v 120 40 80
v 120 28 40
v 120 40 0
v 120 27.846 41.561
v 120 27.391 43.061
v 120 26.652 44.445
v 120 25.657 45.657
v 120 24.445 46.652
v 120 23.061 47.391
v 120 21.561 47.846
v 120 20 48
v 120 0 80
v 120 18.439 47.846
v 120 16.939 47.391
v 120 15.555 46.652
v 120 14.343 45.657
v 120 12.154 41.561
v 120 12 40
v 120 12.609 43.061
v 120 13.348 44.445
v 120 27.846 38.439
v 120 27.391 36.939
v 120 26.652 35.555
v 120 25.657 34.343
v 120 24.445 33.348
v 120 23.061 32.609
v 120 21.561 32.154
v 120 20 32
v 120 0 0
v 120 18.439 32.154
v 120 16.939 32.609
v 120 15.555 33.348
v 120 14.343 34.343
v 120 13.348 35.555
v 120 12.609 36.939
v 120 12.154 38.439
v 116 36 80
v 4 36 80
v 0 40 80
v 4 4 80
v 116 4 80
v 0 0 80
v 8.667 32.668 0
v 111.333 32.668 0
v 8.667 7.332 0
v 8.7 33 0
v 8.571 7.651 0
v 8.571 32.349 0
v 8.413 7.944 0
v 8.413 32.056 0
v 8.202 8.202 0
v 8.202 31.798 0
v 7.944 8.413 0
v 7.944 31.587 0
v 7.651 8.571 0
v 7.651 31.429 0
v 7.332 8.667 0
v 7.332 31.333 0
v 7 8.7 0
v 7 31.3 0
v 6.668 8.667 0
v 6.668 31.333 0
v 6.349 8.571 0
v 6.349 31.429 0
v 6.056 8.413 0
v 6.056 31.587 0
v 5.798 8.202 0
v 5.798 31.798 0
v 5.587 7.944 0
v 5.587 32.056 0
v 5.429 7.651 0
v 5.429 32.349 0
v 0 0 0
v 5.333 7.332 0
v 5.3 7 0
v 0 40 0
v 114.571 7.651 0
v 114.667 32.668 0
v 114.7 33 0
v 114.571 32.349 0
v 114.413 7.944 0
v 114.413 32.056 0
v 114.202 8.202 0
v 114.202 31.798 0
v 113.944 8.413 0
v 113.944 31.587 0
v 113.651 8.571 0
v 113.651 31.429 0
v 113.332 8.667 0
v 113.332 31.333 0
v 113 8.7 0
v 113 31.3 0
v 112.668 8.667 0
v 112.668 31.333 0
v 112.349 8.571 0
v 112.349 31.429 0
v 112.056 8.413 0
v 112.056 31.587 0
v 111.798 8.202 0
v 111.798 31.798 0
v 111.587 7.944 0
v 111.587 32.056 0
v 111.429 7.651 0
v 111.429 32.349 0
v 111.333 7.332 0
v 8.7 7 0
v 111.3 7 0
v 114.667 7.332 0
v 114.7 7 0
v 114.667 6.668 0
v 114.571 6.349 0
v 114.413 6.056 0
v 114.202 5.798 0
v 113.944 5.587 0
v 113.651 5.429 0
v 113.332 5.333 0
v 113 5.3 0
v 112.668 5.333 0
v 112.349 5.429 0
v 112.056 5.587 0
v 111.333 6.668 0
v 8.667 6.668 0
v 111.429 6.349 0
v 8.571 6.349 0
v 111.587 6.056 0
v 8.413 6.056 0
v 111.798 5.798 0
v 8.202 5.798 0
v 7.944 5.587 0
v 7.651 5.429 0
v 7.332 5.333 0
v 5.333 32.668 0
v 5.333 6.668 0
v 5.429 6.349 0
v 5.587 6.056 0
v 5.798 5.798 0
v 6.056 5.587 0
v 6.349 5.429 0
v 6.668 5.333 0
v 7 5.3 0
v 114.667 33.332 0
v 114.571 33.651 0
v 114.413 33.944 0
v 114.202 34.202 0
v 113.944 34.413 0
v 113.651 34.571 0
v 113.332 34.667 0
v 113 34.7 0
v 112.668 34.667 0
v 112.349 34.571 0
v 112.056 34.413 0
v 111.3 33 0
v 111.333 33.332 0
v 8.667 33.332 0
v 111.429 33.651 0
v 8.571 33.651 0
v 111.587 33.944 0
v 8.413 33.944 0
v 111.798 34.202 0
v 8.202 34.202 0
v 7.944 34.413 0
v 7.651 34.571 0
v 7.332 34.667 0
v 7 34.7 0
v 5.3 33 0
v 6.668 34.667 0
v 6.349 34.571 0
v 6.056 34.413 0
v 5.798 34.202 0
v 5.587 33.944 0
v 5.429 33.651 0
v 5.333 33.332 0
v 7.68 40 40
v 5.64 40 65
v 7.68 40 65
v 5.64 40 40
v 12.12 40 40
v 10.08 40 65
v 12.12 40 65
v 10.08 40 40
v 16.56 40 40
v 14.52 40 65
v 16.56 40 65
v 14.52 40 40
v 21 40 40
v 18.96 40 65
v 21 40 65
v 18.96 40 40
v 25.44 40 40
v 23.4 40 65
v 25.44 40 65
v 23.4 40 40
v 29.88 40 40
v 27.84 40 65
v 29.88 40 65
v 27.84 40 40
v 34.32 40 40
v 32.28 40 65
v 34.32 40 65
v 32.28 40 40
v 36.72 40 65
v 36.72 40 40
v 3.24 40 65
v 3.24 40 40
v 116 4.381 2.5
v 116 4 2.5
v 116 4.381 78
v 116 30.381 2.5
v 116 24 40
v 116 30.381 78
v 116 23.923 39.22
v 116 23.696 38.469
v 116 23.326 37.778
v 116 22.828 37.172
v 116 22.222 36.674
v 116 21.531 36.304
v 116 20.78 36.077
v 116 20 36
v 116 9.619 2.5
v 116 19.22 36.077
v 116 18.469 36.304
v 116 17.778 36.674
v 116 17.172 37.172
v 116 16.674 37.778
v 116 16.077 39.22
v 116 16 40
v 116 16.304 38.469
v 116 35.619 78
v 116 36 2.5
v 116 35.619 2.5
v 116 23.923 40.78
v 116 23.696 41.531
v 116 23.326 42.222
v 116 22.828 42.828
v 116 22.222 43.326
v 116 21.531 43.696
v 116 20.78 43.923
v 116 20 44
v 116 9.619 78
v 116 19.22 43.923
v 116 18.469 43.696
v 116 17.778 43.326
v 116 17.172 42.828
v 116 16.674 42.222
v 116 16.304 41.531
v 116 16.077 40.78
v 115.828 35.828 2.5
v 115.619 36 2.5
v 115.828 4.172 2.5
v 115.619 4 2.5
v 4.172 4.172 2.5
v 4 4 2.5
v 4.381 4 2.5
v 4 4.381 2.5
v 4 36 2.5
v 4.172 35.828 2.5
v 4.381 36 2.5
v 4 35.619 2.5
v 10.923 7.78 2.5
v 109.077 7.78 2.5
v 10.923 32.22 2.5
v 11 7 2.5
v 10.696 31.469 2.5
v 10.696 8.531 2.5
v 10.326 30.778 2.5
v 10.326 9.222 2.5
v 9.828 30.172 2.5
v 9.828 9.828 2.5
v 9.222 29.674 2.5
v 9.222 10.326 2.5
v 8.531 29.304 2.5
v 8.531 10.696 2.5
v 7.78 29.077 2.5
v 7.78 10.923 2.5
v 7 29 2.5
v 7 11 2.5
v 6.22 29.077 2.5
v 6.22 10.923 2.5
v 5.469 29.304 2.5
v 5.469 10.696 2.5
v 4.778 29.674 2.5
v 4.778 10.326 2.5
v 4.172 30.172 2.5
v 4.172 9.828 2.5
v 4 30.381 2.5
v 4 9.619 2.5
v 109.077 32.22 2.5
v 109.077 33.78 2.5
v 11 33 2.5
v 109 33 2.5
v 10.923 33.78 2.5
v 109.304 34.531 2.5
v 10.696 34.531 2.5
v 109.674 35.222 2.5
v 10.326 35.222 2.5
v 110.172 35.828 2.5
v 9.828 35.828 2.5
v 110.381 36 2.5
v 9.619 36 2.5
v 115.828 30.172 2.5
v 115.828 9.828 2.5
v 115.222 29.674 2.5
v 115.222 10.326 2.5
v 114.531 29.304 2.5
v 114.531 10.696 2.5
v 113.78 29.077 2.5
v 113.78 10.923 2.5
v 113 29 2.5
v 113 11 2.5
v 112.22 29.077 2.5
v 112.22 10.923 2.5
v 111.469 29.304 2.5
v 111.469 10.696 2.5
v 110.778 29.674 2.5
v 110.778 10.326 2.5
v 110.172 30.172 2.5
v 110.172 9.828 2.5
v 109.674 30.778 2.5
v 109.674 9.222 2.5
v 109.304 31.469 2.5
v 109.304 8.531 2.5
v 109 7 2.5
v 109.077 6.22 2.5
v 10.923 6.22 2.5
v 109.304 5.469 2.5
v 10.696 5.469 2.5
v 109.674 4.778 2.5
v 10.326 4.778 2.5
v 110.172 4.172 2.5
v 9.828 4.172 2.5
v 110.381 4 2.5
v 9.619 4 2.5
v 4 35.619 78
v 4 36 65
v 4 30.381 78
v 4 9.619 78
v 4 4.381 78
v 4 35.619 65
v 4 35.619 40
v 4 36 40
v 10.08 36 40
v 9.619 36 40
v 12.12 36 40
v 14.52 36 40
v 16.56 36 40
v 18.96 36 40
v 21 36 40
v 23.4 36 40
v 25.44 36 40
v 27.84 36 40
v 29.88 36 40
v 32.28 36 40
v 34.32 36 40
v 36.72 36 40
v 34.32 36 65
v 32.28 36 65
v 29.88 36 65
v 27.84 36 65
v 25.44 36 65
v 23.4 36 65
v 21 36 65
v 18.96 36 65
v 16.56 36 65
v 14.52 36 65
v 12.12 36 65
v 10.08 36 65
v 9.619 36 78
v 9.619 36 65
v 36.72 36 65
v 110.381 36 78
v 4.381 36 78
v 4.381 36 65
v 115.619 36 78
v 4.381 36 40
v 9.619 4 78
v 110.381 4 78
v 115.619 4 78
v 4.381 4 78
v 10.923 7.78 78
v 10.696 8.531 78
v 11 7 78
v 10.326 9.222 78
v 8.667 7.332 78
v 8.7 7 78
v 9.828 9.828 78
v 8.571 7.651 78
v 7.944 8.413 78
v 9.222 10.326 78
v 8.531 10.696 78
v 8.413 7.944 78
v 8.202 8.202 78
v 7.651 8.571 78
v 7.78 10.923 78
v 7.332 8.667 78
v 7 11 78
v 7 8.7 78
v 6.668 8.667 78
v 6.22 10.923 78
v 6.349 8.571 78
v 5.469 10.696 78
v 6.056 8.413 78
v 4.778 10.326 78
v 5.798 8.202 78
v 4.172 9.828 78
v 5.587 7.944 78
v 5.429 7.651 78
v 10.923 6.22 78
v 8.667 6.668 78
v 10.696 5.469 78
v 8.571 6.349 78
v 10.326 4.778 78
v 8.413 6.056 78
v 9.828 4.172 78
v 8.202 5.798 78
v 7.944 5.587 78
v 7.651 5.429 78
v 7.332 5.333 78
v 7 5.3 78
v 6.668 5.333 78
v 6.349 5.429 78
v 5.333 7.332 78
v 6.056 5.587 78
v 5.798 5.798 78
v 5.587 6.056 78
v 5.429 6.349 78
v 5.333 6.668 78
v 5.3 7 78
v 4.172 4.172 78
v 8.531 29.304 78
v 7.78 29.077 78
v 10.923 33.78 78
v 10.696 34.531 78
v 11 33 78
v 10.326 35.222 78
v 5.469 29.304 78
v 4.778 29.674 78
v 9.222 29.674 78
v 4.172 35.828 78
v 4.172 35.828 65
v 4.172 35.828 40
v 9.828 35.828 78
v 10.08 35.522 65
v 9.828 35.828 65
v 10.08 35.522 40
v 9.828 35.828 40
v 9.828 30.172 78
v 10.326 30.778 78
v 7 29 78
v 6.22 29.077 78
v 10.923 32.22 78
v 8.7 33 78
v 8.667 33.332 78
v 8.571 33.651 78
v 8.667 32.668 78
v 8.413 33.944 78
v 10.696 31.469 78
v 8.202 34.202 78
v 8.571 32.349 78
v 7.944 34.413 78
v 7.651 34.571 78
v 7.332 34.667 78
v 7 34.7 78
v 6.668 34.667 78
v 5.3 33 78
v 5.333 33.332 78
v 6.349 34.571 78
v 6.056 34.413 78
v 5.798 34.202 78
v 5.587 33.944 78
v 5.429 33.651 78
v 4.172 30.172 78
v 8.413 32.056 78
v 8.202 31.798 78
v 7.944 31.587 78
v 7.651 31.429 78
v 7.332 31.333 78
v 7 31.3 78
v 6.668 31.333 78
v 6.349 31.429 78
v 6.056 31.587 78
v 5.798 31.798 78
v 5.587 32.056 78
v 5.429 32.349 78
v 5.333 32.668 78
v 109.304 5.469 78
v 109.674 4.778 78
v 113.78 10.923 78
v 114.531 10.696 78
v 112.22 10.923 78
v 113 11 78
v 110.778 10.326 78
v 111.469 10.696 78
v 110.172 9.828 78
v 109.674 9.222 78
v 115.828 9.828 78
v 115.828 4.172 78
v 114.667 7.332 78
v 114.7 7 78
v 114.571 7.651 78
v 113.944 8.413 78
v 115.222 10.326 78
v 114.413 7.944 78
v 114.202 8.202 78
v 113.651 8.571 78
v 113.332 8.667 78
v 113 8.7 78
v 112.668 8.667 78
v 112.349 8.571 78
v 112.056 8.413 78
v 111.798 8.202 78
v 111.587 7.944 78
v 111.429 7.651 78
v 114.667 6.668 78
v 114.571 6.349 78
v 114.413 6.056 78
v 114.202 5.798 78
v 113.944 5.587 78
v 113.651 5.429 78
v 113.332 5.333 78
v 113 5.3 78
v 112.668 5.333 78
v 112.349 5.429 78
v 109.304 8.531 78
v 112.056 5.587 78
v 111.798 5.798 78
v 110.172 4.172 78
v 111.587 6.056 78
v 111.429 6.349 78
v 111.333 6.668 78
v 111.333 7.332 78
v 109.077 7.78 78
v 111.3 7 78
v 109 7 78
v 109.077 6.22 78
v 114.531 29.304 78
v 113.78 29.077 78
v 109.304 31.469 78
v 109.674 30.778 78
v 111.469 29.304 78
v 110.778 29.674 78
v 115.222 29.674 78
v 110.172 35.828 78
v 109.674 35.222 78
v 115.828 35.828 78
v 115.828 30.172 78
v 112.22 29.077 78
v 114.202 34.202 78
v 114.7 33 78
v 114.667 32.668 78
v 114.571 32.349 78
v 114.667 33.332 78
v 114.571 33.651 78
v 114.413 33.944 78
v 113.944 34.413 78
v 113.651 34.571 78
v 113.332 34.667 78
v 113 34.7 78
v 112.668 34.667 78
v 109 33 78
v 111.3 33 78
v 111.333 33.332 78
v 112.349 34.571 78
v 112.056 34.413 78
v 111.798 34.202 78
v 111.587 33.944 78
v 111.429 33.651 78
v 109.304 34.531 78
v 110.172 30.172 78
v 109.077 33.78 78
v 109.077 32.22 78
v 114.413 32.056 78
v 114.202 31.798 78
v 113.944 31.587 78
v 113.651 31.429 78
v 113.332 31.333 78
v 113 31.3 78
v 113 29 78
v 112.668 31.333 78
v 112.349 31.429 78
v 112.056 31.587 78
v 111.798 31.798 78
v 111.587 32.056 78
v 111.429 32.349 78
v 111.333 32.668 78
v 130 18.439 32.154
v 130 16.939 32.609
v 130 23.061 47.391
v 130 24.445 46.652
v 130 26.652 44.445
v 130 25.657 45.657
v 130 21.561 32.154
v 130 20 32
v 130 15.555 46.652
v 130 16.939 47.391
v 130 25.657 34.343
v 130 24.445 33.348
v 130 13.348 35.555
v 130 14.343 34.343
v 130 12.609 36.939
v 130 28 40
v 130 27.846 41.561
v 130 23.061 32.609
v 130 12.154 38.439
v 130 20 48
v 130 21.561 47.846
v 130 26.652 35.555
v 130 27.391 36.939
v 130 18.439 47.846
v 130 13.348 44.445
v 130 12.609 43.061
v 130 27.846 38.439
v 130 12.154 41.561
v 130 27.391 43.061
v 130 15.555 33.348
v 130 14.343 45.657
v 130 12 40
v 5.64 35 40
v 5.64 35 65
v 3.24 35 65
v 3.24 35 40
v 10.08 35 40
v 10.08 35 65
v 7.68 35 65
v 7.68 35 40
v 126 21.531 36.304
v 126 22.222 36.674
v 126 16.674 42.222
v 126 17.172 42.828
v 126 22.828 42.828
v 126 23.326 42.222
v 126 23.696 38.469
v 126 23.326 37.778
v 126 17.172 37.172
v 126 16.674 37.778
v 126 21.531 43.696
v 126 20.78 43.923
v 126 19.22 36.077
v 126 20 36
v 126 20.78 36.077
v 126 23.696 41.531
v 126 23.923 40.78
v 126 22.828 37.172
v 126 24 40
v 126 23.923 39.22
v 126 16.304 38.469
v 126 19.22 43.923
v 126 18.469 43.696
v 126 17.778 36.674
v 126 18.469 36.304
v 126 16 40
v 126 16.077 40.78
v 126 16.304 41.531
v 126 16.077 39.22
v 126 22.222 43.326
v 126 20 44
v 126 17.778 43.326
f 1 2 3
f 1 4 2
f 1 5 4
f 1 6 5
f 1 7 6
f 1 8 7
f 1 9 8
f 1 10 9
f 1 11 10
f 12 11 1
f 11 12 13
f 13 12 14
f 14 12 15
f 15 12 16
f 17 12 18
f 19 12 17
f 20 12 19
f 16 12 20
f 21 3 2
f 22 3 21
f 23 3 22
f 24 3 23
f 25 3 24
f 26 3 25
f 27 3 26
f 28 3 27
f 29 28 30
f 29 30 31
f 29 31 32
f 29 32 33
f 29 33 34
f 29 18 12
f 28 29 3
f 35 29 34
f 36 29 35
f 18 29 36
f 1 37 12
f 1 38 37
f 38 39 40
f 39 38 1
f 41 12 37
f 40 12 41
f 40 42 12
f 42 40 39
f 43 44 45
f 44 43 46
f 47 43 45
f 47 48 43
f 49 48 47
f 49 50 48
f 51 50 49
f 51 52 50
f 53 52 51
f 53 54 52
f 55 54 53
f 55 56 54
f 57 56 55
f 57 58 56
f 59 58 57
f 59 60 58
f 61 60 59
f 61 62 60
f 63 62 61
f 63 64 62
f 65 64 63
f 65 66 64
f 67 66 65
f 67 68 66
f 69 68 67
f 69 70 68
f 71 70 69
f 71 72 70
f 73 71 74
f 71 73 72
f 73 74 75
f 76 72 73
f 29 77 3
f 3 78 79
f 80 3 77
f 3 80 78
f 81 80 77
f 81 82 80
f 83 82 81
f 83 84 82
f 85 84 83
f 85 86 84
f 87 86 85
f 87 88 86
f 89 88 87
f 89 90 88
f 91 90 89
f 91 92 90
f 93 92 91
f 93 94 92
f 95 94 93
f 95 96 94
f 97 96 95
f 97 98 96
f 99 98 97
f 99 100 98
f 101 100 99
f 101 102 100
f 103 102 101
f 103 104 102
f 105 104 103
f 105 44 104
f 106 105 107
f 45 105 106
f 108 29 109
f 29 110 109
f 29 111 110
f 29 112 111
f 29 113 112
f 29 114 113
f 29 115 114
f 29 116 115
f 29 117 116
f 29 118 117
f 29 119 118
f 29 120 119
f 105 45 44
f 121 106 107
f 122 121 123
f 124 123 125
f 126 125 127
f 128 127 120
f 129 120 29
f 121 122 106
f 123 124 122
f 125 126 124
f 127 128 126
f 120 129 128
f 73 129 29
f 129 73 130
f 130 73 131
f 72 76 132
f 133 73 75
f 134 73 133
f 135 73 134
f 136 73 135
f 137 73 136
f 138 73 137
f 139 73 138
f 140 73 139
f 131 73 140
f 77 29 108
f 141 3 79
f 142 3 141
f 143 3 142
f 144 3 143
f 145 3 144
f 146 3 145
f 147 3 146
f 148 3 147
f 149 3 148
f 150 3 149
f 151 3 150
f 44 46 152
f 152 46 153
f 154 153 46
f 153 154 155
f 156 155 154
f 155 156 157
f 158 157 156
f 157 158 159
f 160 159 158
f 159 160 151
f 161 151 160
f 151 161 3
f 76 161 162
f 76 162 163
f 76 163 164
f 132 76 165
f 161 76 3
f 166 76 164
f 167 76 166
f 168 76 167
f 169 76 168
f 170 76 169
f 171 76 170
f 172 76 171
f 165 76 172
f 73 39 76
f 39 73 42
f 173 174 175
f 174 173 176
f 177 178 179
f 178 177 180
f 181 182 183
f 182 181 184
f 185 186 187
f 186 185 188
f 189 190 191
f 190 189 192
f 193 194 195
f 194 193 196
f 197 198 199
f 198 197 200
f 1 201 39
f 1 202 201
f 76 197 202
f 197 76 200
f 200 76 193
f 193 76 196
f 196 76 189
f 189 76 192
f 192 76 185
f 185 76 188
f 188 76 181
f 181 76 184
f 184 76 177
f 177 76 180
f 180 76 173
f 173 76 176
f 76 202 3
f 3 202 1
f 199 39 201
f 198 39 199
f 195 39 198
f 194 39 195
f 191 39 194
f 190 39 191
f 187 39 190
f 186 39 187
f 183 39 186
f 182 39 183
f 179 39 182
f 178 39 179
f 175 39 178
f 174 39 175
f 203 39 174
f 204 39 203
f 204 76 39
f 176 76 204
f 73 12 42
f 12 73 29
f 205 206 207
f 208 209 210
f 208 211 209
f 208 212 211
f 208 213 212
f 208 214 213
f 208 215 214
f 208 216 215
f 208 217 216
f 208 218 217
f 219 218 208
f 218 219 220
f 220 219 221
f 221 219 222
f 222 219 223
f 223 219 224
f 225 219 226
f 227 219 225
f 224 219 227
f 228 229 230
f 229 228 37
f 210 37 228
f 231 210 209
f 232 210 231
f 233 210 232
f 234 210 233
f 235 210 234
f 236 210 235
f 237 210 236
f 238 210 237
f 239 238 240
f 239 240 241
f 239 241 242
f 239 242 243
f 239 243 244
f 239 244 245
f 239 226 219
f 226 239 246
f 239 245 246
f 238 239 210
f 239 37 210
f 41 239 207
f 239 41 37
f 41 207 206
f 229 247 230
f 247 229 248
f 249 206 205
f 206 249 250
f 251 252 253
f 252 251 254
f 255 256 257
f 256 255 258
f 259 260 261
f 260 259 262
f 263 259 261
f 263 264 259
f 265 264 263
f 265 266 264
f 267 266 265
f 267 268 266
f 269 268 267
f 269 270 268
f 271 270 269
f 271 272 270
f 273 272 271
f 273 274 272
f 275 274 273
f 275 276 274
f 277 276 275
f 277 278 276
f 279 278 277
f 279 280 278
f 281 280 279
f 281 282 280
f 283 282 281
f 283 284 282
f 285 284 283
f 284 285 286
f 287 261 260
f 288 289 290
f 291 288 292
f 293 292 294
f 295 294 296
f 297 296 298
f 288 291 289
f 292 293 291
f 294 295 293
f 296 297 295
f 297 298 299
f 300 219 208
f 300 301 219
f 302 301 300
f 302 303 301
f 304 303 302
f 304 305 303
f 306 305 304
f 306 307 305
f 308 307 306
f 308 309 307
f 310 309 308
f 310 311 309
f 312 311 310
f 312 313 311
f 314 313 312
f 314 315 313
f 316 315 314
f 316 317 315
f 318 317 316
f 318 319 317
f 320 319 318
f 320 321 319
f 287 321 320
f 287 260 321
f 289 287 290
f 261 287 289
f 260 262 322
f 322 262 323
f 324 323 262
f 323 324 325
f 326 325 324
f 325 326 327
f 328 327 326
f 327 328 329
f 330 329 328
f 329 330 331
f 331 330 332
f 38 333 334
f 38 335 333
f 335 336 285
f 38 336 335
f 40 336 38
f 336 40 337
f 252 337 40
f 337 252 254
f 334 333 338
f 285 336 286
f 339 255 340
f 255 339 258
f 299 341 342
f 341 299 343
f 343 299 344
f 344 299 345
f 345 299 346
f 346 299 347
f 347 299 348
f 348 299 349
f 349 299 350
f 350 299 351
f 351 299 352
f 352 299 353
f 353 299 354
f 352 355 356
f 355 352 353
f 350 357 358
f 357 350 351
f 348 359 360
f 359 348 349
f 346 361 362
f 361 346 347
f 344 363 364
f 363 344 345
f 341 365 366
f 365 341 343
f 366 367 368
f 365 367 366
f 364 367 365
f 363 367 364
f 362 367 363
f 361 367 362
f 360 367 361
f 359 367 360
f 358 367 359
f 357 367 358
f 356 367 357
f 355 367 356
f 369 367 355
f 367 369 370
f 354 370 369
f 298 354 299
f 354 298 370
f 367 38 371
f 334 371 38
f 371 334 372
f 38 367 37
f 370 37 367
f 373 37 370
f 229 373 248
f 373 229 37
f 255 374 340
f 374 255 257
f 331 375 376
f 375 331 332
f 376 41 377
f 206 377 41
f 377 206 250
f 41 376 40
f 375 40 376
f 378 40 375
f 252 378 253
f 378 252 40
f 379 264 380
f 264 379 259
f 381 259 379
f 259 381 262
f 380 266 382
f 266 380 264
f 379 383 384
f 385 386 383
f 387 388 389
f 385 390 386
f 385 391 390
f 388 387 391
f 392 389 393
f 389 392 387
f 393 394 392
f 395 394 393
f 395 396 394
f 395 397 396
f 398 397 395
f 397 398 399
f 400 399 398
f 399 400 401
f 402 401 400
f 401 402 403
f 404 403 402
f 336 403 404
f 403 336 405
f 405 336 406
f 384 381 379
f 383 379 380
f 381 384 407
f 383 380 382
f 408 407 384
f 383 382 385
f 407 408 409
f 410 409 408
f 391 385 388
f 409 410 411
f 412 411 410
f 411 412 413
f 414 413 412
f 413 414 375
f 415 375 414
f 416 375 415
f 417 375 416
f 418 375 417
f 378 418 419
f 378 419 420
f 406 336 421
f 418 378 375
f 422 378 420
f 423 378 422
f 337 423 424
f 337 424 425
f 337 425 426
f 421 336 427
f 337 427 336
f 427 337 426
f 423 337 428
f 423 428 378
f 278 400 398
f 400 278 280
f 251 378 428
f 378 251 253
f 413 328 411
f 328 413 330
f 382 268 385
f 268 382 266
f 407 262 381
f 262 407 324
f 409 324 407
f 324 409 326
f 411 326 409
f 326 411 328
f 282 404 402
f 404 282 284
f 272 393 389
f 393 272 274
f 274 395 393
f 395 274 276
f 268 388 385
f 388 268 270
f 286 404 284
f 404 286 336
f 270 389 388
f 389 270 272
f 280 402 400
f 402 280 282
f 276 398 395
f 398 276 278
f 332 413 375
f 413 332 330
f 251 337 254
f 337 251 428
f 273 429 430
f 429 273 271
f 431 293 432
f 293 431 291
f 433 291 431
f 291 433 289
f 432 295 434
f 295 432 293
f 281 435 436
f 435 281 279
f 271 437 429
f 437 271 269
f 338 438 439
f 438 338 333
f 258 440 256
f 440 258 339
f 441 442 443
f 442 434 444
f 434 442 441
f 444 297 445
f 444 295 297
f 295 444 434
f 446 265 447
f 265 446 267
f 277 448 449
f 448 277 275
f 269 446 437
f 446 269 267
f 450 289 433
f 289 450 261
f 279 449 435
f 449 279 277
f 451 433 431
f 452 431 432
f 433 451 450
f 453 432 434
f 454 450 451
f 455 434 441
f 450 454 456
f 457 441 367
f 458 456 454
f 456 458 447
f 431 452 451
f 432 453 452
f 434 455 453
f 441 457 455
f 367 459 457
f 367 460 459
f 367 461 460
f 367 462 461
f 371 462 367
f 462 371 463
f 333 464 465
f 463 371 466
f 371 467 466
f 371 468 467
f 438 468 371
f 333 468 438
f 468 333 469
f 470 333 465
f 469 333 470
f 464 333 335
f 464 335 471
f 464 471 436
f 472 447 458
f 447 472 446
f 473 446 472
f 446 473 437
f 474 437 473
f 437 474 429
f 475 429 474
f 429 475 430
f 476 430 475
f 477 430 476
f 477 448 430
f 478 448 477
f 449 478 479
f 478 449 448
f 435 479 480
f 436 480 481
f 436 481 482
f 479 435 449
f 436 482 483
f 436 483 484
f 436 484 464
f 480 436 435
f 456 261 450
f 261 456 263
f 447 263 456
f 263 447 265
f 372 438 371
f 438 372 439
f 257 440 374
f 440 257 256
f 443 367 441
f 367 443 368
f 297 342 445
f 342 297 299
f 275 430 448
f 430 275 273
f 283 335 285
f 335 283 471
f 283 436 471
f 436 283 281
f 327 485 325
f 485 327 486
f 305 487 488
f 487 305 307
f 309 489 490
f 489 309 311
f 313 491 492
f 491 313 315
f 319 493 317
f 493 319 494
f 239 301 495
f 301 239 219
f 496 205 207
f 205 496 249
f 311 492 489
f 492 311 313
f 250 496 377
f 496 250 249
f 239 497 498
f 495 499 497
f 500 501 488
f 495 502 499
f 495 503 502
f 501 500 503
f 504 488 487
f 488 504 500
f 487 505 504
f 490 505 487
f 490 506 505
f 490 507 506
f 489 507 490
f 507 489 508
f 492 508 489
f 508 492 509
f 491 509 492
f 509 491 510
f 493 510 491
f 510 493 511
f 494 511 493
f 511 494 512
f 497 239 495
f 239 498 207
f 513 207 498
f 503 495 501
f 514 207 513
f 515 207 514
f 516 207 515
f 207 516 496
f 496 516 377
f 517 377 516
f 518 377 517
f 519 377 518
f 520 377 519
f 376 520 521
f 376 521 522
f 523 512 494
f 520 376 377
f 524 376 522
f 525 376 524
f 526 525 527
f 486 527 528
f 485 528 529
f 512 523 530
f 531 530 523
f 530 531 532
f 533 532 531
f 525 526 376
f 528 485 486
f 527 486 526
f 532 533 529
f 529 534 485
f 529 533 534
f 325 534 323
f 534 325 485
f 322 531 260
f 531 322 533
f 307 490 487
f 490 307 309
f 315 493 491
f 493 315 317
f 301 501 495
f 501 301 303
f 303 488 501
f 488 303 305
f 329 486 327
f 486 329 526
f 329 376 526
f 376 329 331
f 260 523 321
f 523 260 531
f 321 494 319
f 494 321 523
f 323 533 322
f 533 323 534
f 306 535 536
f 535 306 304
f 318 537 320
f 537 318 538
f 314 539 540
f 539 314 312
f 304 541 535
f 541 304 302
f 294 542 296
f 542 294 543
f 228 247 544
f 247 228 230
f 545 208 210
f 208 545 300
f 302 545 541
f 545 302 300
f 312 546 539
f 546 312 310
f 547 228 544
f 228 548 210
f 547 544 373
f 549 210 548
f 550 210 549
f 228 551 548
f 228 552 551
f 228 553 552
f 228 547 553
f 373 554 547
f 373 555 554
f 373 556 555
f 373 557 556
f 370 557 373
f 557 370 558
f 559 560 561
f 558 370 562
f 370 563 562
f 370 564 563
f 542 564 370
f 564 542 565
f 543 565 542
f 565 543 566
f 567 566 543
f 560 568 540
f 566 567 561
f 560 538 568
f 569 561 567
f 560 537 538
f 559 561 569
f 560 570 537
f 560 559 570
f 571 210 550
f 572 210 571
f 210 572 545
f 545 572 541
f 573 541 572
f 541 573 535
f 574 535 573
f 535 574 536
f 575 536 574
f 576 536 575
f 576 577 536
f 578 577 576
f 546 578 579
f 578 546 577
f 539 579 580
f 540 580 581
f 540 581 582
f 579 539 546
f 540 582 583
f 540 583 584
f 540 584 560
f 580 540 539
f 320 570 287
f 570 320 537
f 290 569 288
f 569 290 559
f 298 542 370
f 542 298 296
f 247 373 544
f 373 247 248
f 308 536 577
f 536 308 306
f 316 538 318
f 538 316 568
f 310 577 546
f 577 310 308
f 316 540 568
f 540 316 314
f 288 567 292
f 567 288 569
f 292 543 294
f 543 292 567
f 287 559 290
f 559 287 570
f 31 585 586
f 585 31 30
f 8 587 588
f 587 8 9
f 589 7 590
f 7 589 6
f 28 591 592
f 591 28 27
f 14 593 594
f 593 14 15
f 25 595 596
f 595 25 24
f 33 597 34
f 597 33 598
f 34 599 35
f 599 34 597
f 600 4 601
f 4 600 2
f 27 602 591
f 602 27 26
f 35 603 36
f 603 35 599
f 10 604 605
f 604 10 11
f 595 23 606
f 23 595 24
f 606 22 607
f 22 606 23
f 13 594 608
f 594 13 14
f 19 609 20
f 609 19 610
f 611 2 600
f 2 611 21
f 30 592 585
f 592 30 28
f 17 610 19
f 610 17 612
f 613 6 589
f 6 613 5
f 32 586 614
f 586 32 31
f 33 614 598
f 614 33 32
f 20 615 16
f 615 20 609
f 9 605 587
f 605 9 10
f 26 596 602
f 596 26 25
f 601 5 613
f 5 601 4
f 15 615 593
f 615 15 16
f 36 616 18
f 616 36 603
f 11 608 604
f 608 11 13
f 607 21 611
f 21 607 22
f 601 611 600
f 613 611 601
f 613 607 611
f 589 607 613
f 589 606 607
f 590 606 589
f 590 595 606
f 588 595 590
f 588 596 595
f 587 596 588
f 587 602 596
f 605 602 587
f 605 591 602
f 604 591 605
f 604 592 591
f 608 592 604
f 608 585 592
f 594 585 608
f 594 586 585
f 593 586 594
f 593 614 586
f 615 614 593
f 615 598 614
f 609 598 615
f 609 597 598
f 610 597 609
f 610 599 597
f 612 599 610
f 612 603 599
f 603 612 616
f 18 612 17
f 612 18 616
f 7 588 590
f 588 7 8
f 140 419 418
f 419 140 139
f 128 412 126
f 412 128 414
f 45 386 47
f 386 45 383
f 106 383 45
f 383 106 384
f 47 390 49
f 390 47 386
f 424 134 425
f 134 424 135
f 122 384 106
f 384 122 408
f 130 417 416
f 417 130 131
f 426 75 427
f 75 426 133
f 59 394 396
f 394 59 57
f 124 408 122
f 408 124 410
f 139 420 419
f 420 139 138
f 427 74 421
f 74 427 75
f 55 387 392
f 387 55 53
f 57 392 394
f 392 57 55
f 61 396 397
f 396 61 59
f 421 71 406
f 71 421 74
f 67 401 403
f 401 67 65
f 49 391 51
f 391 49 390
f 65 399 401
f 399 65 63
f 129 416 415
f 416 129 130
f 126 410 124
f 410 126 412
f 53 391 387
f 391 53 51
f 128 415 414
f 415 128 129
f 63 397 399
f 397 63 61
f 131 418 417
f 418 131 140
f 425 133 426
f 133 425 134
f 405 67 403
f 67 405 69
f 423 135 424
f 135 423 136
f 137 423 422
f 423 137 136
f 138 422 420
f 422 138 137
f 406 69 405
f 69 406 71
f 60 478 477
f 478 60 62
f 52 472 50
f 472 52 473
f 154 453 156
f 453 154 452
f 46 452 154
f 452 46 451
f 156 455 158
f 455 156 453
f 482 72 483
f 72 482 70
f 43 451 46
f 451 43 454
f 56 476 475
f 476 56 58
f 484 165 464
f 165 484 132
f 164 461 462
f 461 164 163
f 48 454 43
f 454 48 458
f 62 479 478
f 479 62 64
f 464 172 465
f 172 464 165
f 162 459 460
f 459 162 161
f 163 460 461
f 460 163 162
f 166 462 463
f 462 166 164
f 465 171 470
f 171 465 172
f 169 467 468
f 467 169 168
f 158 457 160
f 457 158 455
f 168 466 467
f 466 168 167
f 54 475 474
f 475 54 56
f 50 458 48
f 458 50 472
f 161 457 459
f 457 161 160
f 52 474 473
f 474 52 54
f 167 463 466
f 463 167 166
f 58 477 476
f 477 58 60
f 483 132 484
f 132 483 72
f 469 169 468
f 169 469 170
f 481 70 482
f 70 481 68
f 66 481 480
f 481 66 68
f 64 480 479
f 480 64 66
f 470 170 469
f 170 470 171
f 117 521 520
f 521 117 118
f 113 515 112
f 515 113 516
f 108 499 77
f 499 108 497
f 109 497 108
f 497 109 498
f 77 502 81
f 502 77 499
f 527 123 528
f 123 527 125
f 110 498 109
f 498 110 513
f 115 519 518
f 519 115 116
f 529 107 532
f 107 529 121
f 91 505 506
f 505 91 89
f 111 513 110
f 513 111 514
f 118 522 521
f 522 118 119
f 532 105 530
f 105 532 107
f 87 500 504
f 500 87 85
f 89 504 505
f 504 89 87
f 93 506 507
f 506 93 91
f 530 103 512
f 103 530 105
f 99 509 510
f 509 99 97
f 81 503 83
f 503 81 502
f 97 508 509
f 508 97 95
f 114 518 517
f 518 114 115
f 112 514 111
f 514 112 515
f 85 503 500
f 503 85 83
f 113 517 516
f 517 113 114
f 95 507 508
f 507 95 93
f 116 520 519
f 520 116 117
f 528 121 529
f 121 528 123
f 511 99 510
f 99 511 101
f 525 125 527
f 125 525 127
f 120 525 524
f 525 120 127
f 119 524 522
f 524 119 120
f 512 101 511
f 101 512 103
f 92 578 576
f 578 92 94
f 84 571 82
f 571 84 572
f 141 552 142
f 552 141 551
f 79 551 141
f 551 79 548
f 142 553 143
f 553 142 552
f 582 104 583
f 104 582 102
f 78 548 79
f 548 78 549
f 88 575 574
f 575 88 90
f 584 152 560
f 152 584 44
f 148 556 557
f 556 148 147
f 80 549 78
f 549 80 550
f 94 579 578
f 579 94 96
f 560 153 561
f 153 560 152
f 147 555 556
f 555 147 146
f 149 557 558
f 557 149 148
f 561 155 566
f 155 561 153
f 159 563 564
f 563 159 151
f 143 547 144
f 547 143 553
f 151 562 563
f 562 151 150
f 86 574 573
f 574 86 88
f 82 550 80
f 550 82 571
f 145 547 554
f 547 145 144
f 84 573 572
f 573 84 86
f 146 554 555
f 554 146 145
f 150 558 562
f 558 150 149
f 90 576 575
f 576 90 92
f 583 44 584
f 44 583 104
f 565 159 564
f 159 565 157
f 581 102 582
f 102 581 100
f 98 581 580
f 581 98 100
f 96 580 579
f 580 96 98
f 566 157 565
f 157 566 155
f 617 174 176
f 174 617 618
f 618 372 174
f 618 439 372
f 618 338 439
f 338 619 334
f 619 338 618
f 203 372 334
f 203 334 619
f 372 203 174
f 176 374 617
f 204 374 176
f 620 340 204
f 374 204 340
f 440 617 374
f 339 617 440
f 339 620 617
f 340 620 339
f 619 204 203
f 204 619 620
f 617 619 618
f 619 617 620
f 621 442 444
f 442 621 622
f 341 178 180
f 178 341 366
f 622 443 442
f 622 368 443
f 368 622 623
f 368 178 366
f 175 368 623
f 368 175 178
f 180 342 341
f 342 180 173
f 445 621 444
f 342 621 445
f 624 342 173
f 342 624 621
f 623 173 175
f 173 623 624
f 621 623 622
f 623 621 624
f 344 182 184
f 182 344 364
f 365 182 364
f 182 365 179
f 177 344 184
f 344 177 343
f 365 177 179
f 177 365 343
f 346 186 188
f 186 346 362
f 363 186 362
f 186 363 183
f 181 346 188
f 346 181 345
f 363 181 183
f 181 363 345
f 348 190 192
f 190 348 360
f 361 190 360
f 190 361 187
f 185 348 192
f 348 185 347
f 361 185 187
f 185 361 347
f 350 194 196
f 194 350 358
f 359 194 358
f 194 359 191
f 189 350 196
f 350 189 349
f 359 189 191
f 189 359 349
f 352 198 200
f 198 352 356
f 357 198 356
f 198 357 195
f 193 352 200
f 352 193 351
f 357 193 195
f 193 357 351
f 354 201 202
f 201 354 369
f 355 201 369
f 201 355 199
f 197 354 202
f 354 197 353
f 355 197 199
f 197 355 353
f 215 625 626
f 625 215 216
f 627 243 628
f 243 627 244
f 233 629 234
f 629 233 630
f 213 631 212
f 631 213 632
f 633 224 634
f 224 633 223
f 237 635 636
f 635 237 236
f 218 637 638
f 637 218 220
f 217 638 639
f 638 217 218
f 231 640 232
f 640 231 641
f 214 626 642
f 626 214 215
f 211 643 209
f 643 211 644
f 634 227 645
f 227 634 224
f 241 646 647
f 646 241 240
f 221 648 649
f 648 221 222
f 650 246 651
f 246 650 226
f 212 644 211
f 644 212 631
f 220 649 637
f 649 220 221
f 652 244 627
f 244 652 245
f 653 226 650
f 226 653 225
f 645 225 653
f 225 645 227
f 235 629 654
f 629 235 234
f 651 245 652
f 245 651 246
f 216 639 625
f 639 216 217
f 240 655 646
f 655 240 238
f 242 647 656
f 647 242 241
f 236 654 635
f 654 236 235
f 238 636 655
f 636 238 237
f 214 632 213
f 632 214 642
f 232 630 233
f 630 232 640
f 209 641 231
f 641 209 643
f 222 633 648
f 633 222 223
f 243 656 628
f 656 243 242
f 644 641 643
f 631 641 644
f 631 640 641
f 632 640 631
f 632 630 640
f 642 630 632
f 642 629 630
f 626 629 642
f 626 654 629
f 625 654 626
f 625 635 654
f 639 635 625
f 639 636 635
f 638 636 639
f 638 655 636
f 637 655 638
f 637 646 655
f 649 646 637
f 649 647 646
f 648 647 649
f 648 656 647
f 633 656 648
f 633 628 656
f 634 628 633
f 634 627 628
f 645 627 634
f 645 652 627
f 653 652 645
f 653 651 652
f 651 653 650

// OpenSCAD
$fn = 32;

// ----------------------------------------------------------------------
// Enclosure body: 120 x 40 x 80 mm, wall 4 mm
// ----------------------------------------------------------------------

// --- parameters (mm) ---
length = 120;             // outside length, X
width = 40;               // outside width, Y
height = 80;              // outside height, Z
wall = 4;                 // side wall thickness
floor_t = 2.5;            // floor thickness
boss_d = 8;               // corner boss diameter
boss_h = 75.5;            // corner boss height above the floor
boss_hole_d = 3.4;        // lid screw clearance in the boss
boss_lip = 7;             // boss centre inset from the corner
vent_slots = 8;           // vent slots in the long wall
vent_w = 2.4;             // vent slot width
vent_h = 25;              // vent slot height
vent_pitch = 4.44;        // vent slot pitch
vent_z = 40;              // vent slot sill height
nipple_d = 16;            // cable gland boss diameter
nipple_h = 10;            // cable gland boss height
nipple_bore = 8;          // cable gland bore

module shell() {
  difference() {
    cube([length, width, height]);
    /* hollow, open at the top */
    translate([wall, wall, floor_t])
      cube([length - 2 * wall, width - 2 * wall, height]);
  }
}

module bosses() {
  /* corner bosses, sunk 1 mm into the floor */
  for (sx = [0, 1]) for (sy = [0, 1])
    translate([sx * (length - 2 * boss_lip) + boss_lip, sy * (width - 2 * boss_lip) + boss_lip, floor_t - 1])
      cylinder(h = boss_h + 1, d = boss_d);
}

module gland() {
  /* boss on the short wall, sunk 1 mm into it */
  translate([length - 1, width / 2, height * 0.5]) rotate([0, 90, 0])
    cylinder(h = nipple_h + 1, d = nipple_d);
}

difference() {
  union() {
    shell();
    bosses();
    gland();
  }
  /* boss screw holes */
  for (sx = [0, 1]) for (sy = [0, 1])
    translate([sx * (length - 2 * boss_lip) + boss_lip, sy * (width - 2 * boss_lip) + boss_lip, -1]) cylinder(h = floor_t + boss_h + 2, d = boss_hole_d);
  /* vent grille in the +Y wall */
  for (i = [0 : vent_slots - 1]) translate([vent_pitch * (i + 1) - vent_w / 2, width - wall - 1, vent_z]) cube([vent_w, wall + 2, vent_h]);
  translate([length, width / 2, height * 0.5]) rotate([0, 90, 0]) translate([0, 0, -nipple_h - 2]) cylinder(h = nipple_h + wall + 4, d = nipple_bore);
}
